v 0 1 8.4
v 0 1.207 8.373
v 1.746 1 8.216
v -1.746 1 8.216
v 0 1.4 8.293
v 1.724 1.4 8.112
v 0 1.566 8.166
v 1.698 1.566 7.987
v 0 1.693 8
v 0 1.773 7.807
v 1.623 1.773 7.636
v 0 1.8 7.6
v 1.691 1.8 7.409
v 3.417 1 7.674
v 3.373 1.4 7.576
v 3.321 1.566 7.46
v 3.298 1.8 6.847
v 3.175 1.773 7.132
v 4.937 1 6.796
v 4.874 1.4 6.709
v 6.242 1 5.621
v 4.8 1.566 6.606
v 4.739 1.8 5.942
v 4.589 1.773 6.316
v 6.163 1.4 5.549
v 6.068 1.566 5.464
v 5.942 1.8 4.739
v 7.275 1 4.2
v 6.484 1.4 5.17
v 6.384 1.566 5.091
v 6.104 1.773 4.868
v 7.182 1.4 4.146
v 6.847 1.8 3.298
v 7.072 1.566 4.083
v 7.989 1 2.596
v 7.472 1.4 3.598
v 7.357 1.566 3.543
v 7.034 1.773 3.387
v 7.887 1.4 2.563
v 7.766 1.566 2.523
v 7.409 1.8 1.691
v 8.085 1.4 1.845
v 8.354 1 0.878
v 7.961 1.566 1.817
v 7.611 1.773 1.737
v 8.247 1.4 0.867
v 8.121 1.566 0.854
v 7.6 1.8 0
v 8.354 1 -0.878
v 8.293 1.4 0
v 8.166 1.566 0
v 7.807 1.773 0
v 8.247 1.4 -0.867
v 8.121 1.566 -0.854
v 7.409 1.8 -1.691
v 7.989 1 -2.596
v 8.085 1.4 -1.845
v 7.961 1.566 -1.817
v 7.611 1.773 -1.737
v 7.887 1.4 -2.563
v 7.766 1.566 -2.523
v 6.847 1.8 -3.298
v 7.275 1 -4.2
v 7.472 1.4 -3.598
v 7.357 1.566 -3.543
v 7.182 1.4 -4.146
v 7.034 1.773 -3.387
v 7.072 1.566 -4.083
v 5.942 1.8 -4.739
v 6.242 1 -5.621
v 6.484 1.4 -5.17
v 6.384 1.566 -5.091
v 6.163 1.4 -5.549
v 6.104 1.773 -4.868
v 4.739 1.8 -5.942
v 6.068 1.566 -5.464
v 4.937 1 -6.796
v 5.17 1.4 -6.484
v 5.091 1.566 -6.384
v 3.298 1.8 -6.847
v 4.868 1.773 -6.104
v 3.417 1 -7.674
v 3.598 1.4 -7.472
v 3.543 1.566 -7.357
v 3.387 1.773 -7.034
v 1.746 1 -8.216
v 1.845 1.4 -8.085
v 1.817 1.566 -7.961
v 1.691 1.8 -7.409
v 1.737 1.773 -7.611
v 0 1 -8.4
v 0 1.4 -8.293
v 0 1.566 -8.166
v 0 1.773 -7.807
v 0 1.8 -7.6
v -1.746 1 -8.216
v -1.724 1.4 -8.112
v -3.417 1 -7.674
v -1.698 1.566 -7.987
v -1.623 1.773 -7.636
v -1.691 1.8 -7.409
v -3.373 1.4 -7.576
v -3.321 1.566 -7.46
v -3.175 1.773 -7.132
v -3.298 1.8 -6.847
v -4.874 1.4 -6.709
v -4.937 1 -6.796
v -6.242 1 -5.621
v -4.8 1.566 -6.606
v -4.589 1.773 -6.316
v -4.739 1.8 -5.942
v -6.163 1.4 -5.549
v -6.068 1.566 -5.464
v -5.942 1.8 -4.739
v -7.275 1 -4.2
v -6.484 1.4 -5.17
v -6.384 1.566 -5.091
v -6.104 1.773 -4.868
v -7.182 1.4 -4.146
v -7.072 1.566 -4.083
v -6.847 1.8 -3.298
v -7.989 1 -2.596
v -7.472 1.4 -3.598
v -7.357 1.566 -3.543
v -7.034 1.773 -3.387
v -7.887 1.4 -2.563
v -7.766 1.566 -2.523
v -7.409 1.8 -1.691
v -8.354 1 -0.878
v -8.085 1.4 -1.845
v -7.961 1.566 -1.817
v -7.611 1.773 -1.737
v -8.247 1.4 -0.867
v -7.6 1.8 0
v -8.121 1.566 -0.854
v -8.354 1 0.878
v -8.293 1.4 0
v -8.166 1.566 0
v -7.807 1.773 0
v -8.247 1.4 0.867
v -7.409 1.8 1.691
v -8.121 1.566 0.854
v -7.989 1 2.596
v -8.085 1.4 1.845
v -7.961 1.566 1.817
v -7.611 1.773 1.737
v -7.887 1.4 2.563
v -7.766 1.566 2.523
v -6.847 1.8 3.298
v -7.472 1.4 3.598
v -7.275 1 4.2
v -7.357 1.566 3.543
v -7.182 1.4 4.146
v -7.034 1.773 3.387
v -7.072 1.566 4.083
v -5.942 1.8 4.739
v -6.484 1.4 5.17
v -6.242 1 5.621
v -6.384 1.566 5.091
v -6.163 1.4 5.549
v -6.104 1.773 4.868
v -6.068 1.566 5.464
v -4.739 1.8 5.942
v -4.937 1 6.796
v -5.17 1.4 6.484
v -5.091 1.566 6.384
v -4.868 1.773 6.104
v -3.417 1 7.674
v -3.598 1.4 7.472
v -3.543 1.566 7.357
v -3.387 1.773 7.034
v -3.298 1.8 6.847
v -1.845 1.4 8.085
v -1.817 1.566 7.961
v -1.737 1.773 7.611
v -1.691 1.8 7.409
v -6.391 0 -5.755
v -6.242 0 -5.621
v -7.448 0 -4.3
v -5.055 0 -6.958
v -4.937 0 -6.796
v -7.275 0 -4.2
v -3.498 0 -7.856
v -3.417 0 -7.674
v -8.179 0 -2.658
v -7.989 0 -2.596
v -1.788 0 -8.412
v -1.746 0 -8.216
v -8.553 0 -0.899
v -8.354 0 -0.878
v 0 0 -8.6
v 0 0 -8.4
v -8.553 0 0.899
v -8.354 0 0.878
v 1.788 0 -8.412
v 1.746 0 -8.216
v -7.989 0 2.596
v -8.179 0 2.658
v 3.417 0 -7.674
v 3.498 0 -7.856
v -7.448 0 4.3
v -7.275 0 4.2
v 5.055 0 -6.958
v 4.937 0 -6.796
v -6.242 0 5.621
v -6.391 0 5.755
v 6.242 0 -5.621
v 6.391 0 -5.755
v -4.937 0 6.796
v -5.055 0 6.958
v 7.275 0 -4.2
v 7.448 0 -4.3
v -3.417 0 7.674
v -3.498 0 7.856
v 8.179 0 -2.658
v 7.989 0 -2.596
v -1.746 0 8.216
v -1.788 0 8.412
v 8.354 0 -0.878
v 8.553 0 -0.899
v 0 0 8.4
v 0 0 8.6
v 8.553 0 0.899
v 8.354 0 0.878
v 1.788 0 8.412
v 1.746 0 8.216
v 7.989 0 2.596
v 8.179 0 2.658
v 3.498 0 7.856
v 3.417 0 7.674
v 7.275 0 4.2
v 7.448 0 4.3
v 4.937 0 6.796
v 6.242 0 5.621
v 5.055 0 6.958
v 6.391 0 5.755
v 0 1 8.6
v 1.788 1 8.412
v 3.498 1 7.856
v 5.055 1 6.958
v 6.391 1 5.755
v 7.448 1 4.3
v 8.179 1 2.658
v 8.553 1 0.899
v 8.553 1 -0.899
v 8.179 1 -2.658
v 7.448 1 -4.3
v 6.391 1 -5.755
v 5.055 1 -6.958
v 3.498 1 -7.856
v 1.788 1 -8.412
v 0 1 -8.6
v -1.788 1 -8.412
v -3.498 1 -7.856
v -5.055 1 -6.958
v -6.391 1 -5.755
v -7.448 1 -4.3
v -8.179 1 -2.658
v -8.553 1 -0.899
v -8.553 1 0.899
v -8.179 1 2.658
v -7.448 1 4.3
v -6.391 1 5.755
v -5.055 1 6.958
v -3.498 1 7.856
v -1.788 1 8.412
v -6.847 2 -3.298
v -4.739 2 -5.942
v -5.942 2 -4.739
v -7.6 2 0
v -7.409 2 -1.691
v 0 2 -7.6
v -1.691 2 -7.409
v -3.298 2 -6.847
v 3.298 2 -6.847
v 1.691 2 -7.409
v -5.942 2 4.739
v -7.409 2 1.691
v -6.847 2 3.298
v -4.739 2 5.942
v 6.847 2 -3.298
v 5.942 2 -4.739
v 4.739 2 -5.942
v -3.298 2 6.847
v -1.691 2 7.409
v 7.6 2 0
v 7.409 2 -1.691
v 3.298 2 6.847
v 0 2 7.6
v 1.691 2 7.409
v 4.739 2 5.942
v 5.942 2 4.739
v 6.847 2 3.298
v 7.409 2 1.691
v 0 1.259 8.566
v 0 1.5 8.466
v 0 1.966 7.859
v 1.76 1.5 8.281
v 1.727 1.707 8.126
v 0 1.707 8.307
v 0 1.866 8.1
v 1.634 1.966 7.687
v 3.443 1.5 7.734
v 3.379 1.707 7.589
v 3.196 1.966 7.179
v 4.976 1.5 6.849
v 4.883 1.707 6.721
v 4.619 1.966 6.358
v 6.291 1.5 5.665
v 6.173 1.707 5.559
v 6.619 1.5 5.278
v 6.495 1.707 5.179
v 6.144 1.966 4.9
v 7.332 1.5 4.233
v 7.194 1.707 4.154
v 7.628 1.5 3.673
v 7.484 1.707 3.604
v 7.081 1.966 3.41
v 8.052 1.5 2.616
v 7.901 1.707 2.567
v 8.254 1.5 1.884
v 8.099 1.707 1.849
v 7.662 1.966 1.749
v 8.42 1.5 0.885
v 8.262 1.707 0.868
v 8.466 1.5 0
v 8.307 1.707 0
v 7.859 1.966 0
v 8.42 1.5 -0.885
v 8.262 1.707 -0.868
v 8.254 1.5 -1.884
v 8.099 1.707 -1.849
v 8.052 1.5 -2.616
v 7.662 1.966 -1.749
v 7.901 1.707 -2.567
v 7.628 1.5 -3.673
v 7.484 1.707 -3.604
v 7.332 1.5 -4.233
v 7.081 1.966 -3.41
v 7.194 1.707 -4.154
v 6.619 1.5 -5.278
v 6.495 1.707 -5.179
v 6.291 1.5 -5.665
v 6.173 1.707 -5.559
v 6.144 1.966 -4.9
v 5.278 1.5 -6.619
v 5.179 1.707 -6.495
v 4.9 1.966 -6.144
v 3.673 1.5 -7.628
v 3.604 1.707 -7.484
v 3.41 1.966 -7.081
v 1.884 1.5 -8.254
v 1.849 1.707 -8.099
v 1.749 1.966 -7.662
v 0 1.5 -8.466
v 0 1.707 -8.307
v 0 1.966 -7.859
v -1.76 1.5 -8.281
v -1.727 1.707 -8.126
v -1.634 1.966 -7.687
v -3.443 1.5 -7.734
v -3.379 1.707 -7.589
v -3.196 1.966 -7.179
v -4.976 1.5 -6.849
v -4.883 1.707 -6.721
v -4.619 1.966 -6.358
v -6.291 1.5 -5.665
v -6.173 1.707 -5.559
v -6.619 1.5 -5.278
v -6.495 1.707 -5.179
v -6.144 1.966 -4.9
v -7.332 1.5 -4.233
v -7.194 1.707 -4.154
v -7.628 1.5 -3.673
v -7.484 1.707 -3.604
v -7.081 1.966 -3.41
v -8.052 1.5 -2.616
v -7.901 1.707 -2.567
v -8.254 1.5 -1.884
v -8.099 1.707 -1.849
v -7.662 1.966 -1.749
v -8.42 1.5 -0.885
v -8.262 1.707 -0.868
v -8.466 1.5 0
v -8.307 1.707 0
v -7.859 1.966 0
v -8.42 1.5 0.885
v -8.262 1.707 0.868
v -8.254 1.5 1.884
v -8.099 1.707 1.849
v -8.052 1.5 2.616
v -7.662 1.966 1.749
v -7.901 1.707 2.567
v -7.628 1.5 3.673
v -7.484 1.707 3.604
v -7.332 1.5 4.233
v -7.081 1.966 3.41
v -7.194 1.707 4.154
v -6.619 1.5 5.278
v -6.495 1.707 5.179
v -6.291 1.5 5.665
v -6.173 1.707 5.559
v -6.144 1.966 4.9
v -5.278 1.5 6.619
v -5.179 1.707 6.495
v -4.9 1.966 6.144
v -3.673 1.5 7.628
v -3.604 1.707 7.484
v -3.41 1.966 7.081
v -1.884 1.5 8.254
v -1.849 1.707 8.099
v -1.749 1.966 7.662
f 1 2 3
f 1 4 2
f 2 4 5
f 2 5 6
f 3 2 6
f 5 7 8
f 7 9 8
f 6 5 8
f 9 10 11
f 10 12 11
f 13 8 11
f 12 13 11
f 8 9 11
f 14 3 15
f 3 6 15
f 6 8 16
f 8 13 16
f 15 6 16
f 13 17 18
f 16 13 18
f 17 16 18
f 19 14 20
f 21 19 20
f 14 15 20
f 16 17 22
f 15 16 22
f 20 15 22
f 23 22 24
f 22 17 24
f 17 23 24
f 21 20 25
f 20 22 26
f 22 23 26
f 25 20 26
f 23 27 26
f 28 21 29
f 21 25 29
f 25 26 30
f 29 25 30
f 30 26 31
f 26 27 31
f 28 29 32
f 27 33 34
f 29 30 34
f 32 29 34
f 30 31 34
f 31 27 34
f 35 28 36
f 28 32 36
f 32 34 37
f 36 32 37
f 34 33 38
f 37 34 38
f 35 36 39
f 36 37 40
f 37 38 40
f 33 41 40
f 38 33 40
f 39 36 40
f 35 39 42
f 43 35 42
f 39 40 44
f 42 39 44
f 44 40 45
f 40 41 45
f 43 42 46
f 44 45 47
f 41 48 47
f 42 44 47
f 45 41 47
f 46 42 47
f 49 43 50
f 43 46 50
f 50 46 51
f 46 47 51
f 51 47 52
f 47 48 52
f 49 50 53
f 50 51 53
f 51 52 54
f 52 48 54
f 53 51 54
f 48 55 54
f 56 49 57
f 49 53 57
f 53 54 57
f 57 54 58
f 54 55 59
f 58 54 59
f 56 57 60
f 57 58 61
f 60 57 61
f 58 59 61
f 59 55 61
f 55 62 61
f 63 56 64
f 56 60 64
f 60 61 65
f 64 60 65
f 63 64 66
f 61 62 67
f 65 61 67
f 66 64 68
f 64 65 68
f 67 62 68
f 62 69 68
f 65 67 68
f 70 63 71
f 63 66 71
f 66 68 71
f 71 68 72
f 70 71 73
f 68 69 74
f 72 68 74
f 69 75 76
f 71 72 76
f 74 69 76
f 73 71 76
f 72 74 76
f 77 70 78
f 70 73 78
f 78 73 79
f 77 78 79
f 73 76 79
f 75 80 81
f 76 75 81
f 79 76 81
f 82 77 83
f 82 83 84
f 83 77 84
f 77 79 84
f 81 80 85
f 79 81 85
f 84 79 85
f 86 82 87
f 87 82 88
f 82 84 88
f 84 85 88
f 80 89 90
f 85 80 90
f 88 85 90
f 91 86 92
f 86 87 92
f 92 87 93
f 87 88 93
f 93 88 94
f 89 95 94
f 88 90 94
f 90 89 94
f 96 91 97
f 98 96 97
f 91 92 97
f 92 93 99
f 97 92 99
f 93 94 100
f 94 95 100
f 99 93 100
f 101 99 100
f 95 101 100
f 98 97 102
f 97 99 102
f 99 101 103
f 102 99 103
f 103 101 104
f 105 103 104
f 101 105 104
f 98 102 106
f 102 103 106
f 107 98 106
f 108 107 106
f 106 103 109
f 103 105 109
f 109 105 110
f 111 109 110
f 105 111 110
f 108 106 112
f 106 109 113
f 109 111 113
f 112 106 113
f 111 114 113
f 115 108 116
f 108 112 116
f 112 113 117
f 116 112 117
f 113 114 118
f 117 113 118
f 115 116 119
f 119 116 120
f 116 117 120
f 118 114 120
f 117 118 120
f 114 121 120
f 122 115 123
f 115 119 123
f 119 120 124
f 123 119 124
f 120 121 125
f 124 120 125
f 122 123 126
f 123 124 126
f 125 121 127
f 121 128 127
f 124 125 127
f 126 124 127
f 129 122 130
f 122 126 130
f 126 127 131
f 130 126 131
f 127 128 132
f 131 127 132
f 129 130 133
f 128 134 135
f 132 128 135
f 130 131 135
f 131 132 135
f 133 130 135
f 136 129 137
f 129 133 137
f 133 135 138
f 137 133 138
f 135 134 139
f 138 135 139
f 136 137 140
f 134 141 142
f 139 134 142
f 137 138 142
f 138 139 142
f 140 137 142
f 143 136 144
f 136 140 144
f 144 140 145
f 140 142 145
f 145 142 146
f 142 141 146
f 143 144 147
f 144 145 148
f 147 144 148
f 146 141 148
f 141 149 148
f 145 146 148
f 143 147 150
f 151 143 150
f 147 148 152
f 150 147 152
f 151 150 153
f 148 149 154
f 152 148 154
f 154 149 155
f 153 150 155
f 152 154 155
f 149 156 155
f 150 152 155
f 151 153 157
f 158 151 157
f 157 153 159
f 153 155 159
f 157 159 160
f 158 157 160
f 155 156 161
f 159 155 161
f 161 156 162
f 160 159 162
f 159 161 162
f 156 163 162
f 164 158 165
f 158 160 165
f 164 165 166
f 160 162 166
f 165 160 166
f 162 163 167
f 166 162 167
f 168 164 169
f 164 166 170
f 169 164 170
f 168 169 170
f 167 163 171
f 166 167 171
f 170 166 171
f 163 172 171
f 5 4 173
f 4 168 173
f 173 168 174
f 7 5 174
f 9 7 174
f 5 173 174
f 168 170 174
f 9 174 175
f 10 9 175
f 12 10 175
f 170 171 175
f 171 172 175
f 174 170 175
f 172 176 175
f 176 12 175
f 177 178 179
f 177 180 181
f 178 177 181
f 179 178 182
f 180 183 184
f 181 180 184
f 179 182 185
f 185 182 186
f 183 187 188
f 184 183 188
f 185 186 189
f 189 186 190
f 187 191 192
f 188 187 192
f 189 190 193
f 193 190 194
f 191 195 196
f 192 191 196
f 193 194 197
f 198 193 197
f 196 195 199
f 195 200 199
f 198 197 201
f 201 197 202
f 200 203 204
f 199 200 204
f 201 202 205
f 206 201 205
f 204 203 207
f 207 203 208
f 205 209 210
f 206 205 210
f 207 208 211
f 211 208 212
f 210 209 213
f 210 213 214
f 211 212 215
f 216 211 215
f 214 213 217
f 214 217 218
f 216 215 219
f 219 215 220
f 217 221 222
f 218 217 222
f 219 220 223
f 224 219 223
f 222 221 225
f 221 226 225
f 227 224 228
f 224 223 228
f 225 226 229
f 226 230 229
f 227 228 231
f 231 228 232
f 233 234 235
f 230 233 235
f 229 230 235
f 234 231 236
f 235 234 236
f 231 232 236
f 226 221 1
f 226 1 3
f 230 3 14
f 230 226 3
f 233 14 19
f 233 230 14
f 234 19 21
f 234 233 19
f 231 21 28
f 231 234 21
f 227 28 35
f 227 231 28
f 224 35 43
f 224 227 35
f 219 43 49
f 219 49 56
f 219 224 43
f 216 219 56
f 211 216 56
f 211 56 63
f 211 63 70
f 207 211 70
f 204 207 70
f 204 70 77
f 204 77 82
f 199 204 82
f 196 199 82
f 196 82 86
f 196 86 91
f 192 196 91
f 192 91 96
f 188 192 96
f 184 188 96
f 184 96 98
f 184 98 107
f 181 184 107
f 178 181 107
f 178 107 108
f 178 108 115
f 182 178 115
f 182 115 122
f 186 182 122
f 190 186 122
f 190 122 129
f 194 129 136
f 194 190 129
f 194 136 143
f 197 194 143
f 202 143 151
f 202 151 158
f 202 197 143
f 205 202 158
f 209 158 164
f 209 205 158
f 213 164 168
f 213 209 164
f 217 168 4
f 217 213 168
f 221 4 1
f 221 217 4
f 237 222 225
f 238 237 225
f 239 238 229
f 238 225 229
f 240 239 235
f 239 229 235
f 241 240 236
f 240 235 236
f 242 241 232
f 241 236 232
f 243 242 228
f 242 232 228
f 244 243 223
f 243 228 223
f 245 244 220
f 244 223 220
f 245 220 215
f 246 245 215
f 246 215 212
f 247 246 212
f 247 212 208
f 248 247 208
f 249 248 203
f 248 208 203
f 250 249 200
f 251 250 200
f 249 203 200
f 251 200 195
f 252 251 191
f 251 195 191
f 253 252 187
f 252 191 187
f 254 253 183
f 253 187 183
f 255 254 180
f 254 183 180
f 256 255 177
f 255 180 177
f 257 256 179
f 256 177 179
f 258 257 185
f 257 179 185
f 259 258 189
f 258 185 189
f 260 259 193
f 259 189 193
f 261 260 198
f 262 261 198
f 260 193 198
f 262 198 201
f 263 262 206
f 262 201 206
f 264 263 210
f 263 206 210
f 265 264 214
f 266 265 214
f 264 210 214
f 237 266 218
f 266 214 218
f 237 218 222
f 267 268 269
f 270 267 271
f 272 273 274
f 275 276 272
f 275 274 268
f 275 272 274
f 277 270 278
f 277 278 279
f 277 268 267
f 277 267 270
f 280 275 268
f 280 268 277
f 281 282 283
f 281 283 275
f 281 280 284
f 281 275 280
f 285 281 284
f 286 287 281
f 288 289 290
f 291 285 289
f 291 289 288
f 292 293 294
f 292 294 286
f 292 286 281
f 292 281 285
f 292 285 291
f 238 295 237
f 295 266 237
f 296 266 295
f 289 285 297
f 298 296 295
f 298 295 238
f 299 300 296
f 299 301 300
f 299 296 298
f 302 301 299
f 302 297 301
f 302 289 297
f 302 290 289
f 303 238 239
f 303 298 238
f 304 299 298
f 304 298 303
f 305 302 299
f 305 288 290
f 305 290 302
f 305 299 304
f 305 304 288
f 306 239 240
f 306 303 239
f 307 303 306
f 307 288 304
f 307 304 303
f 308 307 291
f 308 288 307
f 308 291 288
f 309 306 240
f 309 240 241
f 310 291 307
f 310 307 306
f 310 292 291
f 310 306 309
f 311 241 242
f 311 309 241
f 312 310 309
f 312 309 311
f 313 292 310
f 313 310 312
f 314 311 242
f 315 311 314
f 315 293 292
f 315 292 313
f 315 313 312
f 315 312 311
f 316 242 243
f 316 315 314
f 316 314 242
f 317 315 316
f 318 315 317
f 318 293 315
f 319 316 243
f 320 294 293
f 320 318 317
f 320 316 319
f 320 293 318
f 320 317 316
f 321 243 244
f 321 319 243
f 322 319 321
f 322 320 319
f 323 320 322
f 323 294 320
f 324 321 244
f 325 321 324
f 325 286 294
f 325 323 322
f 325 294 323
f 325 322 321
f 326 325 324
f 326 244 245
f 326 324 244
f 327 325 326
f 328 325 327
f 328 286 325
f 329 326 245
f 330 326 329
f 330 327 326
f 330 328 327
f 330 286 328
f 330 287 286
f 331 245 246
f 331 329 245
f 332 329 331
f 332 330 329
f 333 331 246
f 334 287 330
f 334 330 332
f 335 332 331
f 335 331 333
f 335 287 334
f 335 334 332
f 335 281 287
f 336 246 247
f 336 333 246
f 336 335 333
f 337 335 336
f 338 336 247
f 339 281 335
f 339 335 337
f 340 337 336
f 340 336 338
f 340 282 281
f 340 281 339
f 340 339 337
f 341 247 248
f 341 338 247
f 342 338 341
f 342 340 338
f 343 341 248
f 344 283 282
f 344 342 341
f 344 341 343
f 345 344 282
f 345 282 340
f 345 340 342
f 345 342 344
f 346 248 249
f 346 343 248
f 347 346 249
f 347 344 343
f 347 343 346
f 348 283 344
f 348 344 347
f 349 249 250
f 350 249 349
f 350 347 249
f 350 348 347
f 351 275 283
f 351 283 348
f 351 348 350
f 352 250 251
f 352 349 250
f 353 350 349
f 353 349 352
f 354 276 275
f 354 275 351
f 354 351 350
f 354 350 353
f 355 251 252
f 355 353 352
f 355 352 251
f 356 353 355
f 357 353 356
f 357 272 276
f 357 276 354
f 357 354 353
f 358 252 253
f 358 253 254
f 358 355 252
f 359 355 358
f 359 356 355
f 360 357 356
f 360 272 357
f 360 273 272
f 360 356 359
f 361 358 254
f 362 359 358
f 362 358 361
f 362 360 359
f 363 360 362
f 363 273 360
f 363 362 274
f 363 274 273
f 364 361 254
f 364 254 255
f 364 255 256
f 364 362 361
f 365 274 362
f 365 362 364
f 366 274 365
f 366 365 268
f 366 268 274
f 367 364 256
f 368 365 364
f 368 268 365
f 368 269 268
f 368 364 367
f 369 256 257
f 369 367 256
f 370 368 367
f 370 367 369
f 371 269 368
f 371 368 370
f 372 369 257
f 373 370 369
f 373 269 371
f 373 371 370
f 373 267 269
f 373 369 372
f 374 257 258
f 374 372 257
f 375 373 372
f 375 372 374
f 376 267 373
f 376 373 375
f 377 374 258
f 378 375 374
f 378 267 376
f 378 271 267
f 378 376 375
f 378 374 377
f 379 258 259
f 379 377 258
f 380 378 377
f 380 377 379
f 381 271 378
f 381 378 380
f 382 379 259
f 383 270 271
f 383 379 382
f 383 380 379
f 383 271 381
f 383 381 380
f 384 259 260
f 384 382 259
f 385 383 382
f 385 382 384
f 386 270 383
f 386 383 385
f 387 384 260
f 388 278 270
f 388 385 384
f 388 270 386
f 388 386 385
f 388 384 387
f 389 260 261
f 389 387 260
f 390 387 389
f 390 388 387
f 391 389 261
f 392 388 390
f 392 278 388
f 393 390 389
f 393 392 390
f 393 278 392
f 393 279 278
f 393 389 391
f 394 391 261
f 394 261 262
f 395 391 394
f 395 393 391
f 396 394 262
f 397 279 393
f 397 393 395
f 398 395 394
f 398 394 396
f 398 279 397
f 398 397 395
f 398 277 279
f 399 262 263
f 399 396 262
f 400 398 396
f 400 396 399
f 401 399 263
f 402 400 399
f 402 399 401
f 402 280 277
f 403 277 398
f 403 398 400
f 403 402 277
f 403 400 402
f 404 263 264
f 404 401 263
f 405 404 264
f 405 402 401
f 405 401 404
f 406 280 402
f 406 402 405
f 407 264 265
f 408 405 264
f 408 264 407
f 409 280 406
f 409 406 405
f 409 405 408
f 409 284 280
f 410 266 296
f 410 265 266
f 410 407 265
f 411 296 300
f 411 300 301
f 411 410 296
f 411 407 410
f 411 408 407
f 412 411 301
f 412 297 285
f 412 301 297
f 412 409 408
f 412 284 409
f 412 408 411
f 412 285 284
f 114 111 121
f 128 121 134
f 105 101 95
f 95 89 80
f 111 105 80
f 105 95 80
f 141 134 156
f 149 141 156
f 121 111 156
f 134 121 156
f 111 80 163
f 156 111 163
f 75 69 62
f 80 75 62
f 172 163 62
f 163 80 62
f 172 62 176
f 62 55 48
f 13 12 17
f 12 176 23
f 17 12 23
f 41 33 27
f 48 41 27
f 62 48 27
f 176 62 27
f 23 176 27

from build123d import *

# Parameters (mm, degrees)
SKETCH1_R           = 8.6
BOSS_EXTRUDE1_DEPTH = 2
FILLET1_R           = 1
SHELL1_T            = -0.2


with BuildPart() as part:
    # Sketch1 → Boss-Extrude1 (new body)
    with BuildSketch(Plane(origin=(0, 0, 0), x_dir=(1, 0, 0), z_dir=(0, 1, 0))):
        with Locations(Location((0, 0, 0), (0, 0, 270))):
            Circle(SKETCH1_R)
    extrude(amount=BOSS_EXTRUDE1_DEPTH)

    # Fillet1
    fillet1_edges = [part.edges().sort_by_distance(p)[0] for p in [
        (0, 2, -8.6),
    ]]
    fillet(fillet1_edges, radius=FILLET1_R)

    # Shell1
    shell1_openings = [part.faces().sort_by_distance(p)[0] for p in [
        (0, 0, 0),
    ]]
    offset(amount=SHELL1_T, openings=shell1_openings, kind=Kind.INTERSECTION)


solid = part.part
